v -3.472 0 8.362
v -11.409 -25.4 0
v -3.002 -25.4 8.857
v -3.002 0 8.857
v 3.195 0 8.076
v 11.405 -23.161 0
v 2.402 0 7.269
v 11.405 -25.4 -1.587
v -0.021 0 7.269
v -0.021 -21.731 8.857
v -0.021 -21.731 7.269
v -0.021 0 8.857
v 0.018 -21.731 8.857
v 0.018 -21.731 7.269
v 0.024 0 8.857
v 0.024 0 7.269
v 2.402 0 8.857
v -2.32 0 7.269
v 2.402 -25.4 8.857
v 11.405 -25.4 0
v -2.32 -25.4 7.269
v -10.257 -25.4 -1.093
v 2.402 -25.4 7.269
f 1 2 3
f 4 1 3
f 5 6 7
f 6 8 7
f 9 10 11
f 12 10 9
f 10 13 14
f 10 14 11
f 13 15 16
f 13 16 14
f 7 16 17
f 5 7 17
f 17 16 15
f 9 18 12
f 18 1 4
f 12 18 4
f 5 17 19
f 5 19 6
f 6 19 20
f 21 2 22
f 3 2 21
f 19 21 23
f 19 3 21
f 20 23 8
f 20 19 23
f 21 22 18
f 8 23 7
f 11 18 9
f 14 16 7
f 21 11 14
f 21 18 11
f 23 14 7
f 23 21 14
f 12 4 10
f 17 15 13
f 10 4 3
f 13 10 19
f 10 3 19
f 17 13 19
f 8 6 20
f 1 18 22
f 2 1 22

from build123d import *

# Parameters (mm, degrees)
F1_E0_W  = 12.2108995656
F1_E0_H  = 25.4
F2_DEPTH = 1.5875
F1_E1_W  = 5.4040532559
F1_E1_H  = 25.4
F1_E2_W  = 12.6289542233
F1_E2_H  = 25.4
F3_DEPTH = 1.5875
F5_DEPTH = 6.35
F7_DEPTH = 25.4
F9_DEPTH = 3.683


with BuildPart() as f2:
    # F1_E0 (on explicit) → F2 (new body)
    with BuildSketch(Plane(origin=(-11.4085562527, 0, 0), x_dir=(0.6884263284, 0, 0.7253062735), z_dir=(0.7253062735, 0, -0.6884263284))):
        with Locations((6.1054497828, 12.7)):
            Rectangle(F1_E0_W, F1_E0_H)
    extrude(amount=F2_DEPTH)

    # F1_E1 (on explicit) + F1_E2 (on explicit) → F3 (join)
    with BuildSketch(Plane(origin=(-3.0022514984, 0, 8.85664206), x_dir=(1, 0, 0), z_dir=(0, 0, -1))):
        with Locations((2.702026628, 12.7)):
            Rectangle(F1_E1_W, F1_E1_H)
    with BuildSketch(Plane(origin=(2.4018017575, 0, 8.85664206), x_dir=(0.7128696552, 0, -0.7012965526), z_dir=(-0.7012965526, 0, -0.7128696552))):
        with Locations((6.3144771116, 12.7)):
            Rectangle(F1_E2_W, F1_E2_H)
    extrude(amount=F3_DEPTH, dir=(0, 0, -1))

    # F4 (on face) → F5 (cut)
    with BuildSketch(Plane(origin=(-4.850266242, 0, 4.6036427682), x_dir=(0, 1, 0), z_dir=(0.7253062735, 0, -0.6884263284))):
        Polygon((0, 3.6749982582), (-25.4, -7.8539504933), (0, -7.8539504933), align=None)
    extrude(amount=-F5_DEPTH, mode=Mode.SUBTRACT)

    # F6 (on face) → F7 (cut)
    with BuildSketch(Plane(origin=(4.8153308136, 0, 4.8947955096), x_dir=(0.7128696552, 0, -0.7012965526), z_dir=(-0.7012965526, 0, -0.7128696552))):
        Polygon((9.2433015468, 25.4), (-3.3856526765, 0), (9.2433015468, 0), align=None)
    extrude(amount=-F7_DEPTH, mode=Mode.SUBTRACT)

    # F8 (on face) → F9 (cut)
    with BuildSketch(Plane(origin=(0, 0, 8.85664206), x_dir=(1, 0, 0), z_dir=(0, 0, -1))):
        Polygon((0.017724813, 21.7312984169), (-0.0206197838, 21.7312984169), (-0.0206197838, 0), (0.0242347851, 0), align=None)
    extrude(amount=F9_DEPTH, mode=Mode.SUBTRACT)


solid = f2.part
